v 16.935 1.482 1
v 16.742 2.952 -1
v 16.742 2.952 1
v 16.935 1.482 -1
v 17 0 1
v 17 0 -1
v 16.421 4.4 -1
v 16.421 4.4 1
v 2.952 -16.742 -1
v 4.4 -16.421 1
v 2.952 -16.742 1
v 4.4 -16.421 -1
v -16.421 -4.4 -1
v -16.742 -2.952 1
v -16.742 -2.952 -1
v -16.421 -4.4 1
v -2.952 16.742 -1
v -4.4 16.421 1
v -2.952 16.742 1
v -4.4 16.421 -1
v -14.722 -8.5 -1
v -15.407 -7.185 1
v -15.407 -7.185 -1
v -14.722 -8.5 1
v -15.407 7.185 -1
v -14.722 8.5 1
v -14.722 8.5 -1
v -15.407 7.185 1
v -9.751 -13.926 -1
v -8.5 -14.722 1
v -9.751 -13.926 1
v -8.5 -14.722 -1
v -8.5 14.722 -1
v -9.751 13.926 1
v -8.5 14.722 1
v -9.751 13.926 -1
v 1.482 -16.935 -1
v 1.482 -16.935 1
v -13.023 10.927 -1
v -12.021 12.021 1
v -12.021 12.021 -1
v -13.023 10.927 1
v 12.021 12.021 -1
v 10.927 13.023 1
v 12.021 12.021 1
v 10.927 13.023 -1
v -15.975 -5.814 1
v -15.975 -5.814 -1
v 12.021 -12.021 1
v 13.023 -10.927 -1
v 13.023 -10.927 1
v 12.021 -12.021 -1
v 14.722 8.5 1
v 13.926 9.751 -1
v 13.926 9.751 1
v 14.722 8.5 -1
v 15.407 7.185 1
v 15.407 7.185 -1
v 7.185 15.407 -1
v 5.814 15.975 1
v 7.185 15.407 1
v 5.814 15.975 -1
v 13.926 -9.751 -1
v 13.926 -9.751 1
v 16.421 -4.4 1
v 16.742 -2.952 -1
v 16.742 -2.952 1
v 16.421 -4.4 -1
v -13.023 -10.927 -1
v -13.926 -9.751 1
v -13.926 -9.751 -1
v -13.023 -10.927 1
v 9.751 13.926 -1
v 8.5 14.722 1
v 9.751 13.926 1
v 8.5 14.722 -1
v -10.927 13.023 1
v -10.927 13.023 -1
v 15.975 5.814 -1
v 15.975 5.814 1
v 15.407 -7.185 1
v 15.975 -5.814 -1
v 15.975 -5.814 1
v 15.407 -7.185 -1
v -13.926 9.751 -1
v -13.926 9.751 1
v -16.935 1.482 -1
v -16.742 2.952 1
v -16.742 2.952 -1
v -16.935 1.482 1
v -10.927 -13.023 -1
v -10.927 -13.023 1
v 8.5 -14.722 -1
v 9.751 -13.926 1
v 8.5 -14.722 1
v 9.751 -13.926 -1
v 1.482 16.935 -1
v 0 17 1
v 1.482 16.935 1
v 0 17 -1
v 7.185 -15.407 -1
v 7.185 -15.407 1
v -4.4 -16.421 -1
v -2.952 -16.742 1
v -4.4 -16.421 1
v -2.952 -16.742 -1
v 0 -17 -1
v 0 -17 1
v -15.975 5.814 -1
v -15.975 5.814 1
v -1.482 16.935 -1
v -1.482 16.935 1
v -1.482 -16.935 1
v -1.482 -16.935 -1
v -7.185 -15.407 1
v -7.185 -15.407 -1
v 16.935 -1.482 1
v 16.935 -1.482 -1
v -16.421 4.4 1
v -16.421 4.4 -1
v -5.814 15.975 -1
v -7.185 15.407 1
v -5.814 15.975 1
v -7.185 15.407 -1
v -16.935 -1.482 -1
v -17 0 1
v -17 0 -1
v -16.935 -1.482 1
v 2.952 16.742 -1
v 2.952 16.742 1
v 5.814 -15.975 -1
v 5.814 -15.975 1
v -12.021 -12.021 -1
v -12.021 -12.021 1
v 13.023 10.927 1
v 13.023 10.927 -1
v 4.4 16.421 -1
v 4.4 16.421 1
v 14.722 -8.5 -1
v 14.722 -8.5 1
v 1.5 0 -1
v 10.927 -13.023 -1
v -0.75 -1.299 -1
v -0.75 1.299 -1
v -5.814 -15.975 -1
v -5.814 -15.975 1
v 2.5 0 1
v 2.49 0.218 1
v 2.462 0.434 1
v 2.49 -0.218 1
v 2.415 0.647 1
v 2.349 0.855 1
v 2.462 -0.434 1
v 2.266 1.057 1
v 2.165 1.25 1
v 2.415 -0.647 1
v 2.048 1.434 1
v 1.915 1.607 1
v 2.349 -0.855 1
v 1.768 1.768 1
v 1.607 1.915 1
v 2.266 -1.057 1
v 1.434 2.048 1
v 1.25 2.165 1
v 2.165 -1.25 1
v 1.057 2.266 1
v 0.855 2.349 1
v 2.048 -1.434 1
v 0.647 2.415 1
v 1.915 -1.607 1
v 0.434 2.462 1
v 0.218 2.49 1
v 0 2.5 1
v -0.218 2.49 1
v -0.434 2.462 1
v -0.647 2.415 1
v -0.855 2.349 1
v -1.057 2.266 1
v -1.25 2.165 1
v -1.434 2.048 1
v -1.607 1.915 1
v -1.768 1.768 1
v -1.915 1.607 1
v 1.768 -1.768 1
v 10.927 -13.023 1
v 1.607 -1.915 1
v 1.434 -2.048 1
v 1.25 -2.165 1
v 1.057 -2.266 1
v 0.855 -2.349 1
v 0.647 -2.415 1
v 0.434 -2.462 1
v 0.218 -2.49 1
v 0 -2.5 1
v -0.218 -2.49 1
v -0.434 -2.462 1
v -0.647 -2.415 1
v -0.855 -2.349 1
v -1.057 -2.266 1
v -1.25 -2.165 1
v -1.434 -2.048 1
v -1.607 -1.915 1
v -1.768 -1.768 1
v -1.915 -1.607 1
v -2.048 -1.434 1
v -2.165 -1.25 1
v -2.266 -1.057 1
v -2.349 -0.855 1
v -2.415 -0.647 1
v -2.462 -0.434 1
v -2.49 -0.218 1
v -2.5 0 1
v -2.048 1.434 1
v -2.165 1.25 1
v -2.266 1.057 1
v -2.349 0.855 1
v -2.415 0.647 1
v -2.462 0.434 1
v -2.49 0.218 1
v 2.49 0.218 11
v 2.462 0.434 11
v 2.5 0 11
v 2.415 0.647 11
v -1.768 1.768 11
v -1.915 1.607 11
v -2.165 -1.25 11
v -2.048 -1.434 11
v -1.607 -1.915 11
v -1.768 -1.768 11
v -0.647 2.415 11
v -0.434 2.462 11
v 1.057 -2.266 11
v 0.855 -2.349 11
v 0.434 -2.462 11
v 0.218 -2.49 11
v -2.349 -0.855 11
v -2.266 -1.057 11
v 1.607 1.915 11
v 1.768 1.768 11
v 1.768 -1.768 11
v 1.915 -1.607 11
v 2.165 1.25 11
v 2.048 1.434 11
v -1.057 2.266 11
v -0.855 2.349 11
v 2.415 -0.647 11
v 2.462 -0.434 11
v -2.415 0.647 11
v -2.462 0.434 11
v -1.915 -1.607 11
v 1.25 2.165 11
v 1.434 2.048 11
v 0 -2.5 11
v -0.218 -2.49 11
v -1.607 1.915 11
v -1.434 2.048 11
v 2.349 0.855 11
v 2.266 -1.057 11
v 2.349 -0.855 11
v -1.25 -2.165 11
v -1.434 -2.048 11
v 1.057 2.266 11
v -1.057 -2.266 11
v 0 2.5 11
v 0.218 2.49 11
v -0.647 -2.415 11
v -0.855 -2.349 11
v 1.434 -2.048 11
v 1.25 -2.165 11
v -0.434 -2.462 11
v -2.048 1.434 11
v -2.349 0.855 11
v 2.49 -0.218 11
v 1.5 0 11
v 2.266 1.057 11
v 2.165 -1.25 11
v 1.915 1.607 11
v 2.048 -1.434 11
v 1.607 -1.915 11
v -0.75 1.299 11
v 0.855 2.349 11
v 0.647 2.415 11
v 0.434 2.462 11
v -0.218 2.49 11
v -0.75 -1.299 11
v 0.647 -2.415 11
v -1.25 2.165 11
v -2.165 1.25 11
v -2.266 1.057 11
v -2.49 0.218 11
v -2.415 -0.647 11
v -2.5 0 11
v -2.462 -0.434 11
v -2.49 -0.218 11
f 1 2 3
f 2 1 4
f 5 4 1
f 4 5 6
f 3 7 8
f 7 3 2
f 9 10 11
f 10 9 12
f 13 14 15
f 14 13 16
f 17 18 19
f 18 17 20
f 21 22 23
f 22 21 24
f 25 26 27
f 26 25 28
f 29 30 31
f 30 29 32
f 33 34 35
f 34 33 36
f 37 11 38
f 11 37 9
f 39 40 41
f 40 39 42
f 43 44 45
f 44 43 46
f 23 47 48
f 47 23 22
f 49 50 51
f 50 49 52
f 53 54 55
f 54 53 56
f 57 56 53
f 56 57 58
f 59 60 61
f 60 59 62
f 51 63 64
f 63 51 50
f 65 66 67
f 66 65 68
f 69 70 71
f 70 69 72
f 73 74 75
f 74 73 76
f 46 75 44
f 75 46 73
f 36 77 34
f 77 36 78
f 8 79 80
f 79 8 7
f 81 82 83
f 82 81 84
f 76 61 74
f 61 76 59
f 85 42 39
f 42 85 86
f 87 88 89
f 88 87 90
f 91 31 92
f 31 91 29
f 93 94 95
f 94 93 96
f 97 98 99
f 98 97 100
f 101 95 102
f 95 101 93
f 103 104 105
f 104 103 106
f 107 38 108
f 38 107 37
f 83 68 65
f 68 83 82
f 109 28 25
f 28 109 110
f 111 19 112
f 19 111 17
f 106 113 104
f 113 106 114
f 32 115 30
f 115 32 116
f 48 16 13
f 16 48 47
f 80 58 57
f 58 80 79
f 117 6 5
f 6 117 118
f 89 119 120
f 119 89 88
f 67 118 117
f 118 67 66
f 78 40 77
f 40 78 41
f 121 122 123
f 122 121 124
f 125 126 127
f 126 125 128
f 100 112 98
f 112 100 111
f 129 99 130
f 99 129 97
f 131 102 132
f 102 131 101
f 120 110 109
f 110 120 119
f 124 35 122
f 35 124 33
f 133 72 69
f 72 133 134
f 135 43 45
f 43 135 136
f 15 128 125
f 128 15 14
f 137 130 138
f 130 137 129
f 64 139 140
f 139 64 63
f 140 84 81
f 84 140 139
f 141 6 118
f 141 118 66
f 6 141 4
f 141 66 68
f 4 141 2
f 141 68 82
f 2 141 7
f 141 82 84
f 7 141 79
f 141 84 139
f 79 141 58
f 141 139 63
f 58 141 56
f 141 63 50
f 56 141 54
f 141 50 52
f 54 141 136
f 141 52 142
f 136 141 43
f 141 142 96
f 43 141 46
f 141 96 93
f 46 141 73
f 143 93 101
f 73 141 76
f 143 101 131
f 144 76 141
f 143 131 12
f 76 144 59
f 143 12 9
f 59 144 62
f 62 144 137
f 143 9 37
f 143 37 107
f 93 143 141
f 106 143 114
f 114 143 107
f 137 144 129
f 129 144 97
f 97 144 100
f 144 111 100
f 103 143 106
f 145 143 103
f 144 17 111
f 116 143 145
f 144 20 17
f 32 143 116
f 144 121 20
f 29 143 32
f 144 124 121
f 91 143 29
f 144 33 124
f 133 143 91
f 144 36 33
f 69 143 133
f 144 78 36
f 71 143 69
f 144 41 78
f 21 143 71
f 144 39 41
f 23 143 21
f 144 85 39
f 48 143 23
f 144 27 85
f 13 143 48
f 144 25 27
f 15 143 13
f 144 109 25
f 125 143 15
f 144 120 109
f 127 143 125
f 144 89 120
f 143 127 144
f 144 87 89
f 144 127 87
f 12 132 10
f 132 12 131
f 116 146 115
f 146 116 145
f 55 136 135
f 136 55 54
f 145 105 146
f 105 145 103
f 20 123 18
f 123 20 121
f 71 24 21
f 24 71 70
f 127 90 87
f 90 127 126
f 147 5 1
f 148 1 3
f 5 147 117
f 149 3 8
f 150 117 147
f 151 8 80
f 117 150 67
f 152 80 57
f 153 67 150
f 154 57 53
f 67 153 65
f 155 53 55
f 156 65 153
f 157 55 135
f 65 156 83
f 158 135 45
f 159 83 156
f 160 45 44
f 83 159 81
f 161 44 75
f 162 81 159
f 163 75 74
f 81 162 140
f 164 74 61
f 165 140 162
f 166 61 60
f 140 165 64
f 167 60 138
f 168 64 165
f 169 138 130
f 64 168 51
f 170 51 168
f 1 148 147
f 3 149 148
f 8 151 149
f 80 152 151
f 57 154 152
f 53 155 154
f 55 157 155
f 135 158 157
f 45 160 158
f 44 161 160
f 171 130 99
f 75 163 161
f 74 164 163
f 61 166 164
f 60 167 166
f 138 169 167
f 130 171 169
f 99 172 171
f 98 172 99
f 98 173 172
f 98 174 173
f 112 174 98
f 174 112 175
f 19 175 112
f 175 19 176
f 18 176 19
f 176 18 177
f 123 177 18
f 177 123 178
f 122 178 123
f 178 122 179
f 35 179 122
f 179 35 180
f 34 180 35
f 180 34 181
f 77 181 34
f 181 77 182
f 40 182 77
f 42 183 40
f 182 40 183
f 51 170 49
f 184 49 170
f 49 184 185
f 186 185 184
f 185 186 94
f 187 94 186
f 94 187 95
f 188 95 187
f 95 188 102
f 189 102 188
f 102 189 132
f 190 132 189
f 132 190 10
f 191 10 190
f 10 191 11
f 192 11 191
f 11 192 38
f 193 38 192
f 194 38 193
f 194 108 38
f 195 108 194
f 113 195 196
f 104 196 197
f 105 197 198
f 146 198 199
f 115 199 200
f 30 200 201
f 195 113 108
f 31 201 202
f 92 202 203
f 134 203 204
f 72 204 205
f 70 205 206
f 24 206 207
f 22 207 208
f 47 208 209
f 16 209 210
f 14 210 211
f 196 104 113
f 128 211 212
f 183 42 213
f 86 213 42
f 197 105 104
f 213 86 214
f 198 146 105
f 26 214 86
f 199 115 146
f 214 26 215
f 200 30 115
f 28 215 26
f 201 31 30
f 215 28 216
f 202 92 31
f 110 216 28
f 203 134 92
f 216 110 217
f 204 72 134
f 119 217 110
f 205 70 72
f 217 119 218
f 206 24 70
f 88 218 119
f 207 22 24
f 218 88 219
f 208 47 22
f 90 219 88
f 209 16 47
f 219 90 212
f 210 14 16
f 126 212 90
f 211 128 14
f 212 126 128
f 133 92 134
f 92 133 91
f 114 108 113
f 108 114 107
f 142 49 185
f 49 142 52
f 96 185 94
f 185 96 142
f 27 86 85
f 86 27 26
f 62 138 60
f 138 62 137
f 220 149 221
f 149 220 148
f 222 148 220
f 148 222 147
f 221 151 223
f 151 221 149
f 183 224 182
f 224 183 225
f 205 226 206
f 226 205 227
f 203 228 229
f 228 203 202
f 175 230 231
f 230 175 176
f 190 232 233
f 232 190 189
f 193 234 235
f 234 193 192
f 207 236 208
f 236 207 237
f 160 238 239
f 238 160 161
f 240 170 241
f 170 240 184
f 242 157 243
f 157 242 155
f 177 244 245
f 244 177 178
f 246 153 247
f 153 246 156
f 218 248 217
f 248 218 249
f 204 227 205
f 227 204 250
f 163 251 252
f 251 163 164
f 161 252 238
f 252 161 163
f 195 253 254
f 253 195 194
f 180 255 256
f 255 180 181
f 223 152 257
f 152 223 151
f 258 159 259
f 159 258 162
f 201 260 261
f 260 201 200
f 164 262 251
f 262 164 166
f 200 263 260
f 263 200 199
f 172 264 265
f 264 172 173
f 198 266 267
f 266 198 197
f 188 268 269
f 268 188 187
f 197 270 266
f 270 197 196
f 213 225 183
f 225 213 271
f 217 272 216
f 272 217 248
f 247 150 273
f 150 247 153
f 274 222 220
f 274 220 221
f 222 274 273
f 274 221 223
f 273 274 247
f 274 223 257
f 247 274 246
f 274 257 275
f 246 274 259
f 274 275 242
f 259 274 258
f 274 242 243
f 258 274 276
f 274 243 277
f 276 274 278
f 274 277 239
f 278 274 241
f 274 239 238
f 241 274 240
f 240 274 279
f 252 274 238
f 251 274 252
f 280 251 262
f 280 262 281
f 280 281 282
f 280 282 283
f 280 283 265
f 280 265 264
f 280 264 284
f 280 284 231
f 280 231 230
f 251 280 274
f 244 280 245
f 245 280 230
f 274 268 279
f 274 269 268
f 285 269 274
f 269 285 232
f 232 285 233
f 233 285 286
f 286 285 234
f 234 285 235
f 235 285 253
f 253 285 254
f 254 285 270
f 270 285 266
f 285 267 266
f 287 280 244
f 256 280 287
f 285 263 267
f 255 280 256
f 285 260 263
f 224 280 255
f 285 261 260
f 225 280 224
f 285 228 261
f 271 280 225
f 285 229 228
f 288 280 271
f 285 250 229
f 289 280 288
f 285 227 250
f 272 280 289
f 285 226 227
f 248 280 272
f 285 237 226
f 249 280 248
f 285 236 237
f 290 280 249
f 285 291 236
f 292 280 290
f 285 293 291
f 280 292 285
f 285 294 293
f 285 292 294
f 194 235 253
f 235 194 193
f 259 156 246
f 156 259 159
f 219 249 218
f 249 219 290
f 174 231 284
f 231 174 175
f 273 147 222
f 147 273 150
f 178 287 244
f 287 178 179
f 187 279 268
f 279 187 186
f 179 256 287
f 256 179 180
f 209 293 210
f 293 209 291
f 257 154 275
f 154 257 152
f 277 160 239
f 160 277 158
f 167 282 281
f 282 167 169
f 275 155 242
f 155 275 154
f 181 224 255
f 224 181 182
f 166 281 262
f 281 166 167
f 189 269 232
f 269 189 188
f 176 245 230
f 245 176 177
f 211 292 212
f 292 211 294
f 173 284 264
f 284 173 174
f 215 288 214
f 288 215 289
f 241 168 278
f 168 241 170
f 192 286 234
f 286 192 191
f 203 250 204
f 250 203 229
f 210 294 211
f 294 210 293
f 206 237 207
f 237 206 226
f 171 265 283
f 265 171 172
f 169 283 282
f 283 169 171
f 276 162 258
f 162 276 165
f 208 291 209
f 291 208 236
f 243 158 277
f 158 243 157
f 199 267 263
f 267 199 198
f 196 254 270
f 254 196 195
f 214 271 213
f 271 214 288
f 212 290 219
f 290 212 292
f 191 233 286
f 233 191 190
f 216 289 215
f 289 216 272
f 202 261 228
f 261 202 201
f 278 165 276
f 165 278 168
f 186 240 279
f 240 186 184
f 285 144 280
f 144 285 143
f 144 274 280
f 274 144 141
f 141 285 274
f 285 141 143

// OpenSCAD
$fa = 5;
$fs = 0.01;

difference()
{
    union()
    {
        cylinder(2, 17, 17, true);
        translate ([0, 0, 1])
        {
            color("grey")cylinder(10, 2.5, 2.5);
        }
    }
    translate([0,0,-2])
    {
        color("orange")cylinder(14, 1.5, 1.5, $fn = 3);
    }
}
